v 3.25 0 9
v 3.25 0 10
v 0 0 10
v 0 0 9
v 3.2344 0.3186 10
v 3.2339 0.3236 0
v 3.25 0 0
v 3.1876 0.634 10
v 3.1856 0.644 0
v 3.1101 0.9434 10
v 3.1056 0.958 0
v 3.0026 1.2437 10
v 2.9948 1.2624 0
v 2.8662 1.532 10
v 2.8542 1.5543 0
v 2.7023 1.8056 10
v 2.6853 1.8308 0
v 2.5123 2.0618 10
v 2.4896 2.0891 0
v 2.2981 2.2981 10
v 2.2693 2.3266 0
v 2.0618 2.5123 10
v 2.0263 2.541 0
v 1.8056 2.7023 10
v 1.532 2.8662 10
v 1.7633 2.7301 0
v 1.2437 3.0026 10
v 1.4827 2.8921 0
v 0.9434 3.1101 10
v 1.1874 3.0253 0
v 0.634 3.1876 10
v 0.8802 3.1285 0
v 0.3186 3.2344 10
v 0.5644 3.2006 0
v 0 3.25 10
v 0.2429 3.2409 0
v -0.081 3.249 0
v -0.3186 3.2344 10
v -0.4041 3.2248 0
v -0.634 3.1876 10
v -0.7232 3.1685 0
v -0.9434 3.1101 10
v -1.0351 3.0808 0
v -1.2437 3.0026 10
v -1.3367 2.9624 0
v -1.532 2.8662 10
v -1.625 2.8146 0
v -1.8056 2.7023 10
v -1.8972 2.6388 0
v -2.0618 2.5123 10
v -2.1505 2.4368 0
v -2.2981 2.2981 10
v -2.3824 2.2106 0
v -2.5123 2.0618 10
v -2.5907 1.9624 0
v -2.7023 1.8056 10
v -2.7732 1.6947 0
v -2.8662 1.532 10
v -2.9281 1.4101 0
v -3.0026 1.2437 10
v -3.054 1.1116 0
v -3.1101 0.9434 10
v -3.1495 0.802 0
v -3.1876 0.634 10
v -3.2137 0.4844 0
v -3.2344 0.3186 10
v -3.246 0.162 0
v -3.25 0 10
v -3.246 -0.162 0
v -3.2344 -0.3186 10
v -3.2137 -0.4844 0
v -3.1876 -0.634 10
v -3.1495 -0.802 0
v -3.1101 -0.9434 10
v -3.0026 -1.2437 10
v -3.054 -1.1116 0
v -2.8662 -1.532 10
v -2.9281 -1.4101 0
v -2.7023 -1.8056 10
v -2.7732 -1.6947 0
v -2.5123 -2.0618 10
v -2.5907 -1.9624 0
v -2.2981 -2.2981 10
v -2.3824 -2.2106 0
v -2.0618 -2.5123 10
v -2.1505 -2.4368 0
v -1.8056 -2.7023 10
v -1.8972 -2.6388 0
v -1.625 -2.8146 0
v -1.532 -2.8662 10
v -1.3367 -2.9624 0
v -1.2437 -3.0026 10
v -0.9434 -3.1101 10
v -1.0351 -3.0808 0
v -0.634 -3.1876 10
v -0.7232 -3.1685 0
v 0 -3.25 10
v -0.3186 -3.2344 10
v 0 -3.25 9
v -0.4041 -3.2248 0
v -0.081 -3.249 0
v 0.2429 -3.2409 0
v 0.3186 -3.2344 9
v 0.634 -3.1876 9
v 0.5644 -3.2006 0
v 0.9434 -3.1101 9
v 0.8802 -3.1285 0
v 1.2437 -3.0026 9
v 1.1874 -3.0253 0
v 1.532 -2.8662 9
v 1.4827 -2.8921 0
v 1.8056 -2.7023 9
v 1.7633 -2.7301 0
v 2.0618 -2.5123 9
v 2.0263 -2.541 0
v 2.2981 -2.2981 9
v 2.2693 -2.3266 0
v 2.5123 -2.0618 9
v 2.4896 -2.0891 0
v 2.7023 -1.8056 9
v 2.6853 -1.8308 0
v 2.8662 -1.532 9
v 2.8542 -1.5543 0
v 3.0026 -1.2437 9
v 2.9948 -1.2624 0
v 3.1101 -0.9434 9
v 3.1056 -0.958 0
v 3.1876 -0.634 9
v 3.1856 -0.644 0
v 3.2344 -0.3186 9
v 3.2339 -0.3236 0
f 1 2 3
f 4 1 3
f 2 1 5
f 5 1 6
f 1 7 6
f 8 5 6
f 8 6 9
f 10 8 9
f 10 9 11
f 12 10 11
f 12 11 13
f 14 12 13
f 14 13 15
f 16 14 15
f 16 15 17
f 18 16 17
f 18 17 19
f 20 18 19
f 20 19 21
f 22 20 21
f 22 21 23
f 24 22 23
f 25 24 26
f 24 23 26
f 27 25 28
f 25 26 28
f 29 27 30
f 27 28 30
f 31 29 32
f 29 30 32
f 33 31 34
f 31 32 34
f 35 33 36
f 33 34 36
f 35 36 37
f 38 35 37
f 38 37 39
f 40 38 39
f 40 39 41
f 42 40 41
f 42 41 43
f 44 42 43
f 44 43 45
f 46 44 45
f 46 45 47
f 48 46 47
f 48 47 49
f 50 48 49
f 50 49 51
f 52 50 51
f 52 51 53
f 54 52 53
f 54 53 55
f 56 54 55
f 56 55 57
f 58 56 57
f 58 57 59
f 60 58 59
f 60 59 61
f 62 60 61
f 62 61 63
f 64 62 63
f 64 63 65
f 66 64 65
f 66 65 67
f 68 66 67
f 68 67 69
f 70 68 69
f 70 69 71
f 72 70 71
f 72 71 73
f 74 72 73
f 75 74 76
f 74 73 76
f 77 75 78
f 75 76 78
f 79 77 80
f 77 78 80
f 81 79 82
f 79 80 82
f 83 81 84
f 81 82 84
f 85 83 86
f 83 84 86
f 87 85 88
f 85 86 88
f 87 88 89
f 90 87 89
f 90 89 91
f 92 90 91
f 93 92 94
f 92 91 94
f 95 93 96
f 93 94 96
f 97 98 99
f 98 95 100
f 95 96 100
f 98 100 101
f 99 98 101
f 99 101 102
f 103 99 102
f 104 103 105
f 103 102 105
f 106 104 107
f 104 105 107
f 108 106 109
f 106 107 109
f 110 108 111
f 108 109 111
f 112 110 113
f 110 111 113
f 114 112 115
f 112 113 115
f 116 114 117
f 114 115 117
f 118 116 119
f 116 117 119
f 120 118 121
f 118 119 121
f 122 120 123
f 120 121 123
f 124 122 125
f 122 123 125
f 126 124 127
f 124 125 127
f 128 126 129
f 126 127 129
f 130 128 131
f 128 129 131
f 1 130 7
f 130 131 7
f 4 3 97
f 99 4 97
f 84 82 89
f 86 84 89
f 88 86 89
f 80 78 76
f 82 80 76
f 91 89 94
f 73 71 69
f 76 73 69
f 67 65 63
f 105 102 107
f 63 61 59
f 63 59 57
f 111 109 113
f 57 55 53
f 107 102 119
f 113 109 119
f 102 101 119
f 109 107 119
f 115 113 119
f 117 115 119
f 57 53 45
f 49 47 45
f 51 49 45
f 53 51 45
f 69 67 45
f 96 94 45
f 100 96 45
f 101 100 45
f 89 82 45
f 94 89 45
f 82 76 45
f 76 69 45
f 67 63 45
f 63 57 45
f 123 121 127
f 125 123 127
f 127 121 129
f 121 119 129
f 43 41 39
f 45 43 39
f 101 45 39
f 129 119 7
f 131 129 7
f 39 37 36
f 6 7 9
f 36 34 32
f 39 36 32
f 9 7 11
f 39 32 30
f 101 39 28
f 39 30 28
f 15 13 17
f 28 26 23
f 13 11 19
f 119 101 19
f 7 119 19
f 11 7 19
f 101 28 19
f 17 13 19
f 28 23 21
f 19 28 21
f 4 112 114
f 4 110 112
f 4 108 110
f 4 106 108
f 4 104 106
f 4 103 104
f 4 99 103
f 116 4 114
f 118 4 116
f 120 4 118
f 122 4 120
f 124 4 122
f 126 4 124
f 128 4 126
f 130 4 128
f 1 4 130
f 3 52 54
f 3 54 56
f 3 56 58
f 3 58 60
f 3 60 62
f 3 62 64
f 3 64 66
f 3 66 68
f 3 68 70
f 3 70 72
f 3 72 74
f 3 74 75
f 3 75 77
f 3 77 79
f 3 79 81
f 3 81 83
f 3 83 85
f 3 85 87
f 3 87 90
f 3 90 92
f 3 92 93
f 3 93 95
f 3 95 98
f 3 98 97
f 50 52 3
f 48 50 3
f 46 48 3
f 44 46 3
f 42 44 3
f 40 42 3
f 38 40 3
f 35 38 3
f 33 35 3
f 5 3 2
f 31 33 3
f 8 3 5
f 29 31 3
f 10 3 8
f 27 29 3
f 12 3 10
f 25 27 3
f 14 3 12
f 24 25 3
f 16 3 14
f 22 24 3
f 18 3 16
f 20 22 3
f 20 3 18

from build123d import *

# Parameters (mm, degrees)
F0_R     = 3.25
F1_DEPTH = 10
F3_DEPTH = 1


with BuildPart() as f1:
    # F0 (on Top) → F1 (new body)
    with BuildSketch(Plane.XY):
        Circle(F0_R)
    extrude(amount=F1_DEPTH)

    # F2 (on face) → F3 (cut)
    with BuildSketch(Plane.XY.offset(10)):
        with BuildLine():
            Line((6.379369, 0), (3.25, 0))
            ThreePointArc((3.25, 0), (2.298097, -2.298097), (0, -3.25))
            Line((0, -3.25), (0, -5.629462))
            Line((0, -5.629462), (6.379369, -5.629462))
            Line((6.379369, -5.629462), (6.379369, 0))
        make_face()
        with BuildLine():
            Line((3.25, 0), (0, 0))
            Line((0, 0), (0, -3.25))
            ThreePointArc((0, -3.25), (2.298097, -2.298097), (3.25, 0))
        make_face()
    extrude(amount=-F3_DEPTH, mode=Mode.SUBTRACT)


with BuildPart() as f4_1:
    # F4: copy of F1
    add(f1.part)


with BuildPart() as f5_1:
    # F5: copy of F4_1
    add(f4_1.part)


with BuildPart() as f6_1:
    # F6: copy of F5_1
    add(f5_1.part)


with BuildPart() as f7_1:
    # F7: copy of F6_1
    add(f6_1.part)


with BuildPart() as f8_1:
    # F8: copy of F7_1
    add(f7_1.part)


with BuildPart() as f9_1:
    # F9: copy of F8_1
    add(f8_1.part)


with BuildPart() as f10_1:
    # F10: copy of F9_1
    add(f9_1.part)


with BuildPart() as f11_1:
    # F11: copy of F1
    add(f1.part)


solid = f1.part
